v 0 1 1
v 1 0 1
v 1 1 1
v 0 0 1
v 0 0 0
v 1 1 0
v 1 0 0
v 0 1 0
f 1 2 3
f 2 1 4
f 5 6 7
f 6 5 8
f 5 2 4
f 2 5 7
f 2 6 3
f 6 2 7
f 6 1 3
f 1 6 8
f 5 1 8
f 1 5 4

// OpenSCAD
// file: lib/params.scad
// Parámetros comunes de Mini16 (mm). Todo el diseño depende de estos valores.

// ---------- Impresión ----------
CL   = 0.4;   // holgura de ajuste entre piezas (0.3-0.4 según la impresora)
GAP  = 1.0;   // separación mínima entre piezas que se mueven entre sí
T    = 3.0;   // brazos y placas estructurales (PETG, 4 perímetros con boquilla 0.4 = 1.6 mm + relleno)
TF   = 2.0;   // placas fijas apoyadas en la cara del servo: deben ser más finas que lo que
              // sobresale el disco (2.6 mm) para no rozar el brazo que gira encima

// ---------- Servo Feetech STS3215 (plano oficial Waveshare/Feetech "SCS215") ----------
S_SHORT  = 10.11;  // del eje al extremo corto
S_LONG   = 35.11;  // del eje al extremo largo (45.22 total)
S_W      = 24.72;  // ancho
S_CASE   = 32.0;   // espesor de la carcasa (entre las caras con discos)
S_DISC_D = 19.2;   // diámetro de los discos (salida y pasivo)
S_DISC_Z = 37.25 / 2;  // cara exterior de cada disco desde el plano medio
S_HORN_R = 7.0;    // radio del círculo de 4 agujeros M2 del disco
M2_HOLE  = 2.4;    // paso para tornillo M2
HORN_CENTER = 6.5; // paso para la cabeza del tornillo central M3 del disco
// Agujeros M2 de la carcasa (en ambas caras), medidos desde el eje a lo largo del cuerpo.
// Cara de salida: 8.3 y 32.75; cara pasiva: 8.3 y 29.0. Se perforan los tres en ambas caras
// para que las piezas sirvan en la pierna izquierda y en la derecha (espejo).
S_CASE_HOLES_X = [8.3, 29.0, 32.75];
S_CASE_HOLE_Y  = 10.25;
S_CORNER_R = sqrt(S_SHORT * S_SHORT + (S_W / 2) * (S_W / 2));  // 16.0: esquina del lado corto

// ---------- Pierna: distancias entre ejes (se pasan al modelo de simulación) ----------
R_CB    = S_CORNER_R + GAP;          // radio interior del travesaño de cada "U"
ARM_R   = 11.0;                      // radio del extremo redondeado de los brazos (cubre el disco)
D_YAW_ROLL   = T + R_CB + 5;         // cara del disco del servo yaw -> eje roll
                                     // (+5 mm: el servo roll, acostado hacia afuera, puede inclinarse ±29°)
D_ROLL_PITCH = S_W / 2 + 3.5 + S_W / 2;   // eje roll -> eje pitch (servo roll sobre servo pitch)
D_THIGH = R_CB + T + GAP + S_W / 2;  // eje cadera pitch -> eje rodilla
// Servo del tobillo pitch en la canilla:
//   "fwd": acostado hacia adelante -> canilla corta (33 mm); la rodilla llega a ~83°
//   "up":  parado a lo largo de la canilla -> canilla de 56 mm; la rodilla llega a ~100°
SHIN_SERVO = "fwd";
D_SHIN  = SHIN_SERVO == "up" ? R_CB + T + GAP + S_LONG : R_CB + T + GAP + S_W / 2;
D_ANKLE = D_THIGH;                   // eje tobillo pitch -> eje tobillo roll
FOOT_CLEAR = 27.5;                   // eje tobillo roll -> cara superior de la plancha del pie
                                     // (deja inclinar el pie ±29° sin tocar el servo, que sobresale hacia afuera)
PLATE_T = 3.0;                       // plancha del pie (PETG)
SOLE_T  = 4.0;                       // suela (TPU 95A)
D_SOLE  = FOOT_CLEAR + PLATE_T + SOLE_T;   // eje tobillo roll -> suela

HIP_Y   = 30.0;                      // separación lateral de cada pierna desde el centro
FOOT_X0 = -38;  FOOT_X1 = 48;        // largo del pie (8.6 cm), x hacia adelante
FOOT_HW = 22;                        // medio ancho del pie (4.4 cm)
ROCKER_R = 6;                        // radio de la suela curva en punta, talón y costados

// ---------- Sensores de pisada (microinterruptor tipo SS-10: MEDIR el comprado) ----------
SW_L = 13.0; SW_W = 6.0; SW_H = 6.5;   // cuerpo
SW_PIN = 2.0;                          // pernos de montaje (separación SW_PIN_DX)
SW_PIN_DX = 6.5;
SW_X = [FOOT_X1 - 11, FOOT_X0 + 11];   // punta y talón

// ---------- Insertos M3 de latón ----------
INSERT_D = 4.0;   // agujero para inserto M3 (revisar con el fabricante del inserto)
INSERT_L = 5.0;
INSERT_BOSS = 7.5;
M3_HOLE = 3.4;

$fn = 48;
// main file
// Imprime los parámetros que usa build_mjcf.py (una sola fuente de verdad: lib/params.scad).
include <lib/params.scad>
echo("S_DISC_Z", S_DISC_Z);
echo("S_CASE", S_CASE);
echo("S_W", S_W);
echo("S_SHORT", S_SHORT);
echo("S_LONG", S_LONG);
echo("D_YAW_ROLL", D_YAW_ROLL);
echo("D_ROLL_PITCH", D_ROLL_PITCH);
echo("D_THIGH", D_THIGH);
echo("D_SHIN", D_SHIN);
echo("D_ANKLE", D_ANKLE);
echo("D_SOLE", D_SOLE);
echo("FOOT_CLEAR", FOOT_CLEAR);
echo("PLATE_T", PLATE_T);
echo("SOLE_T", SOLE_T);
echo("HIP_Y", HIP_Y);
echo("FOOT_X0", FOOT_X0);
echo("FOOT_X1", FOOT_X1);
echo("FOOT_HW", FOOT_HW);
echo("SW_X0", SW_X[0]);
echo("SW_X1", SW_X[1]);
echo("SHIN_UP", SHIN_SERVO == "up" ? 1 : 0);
cube(1);
